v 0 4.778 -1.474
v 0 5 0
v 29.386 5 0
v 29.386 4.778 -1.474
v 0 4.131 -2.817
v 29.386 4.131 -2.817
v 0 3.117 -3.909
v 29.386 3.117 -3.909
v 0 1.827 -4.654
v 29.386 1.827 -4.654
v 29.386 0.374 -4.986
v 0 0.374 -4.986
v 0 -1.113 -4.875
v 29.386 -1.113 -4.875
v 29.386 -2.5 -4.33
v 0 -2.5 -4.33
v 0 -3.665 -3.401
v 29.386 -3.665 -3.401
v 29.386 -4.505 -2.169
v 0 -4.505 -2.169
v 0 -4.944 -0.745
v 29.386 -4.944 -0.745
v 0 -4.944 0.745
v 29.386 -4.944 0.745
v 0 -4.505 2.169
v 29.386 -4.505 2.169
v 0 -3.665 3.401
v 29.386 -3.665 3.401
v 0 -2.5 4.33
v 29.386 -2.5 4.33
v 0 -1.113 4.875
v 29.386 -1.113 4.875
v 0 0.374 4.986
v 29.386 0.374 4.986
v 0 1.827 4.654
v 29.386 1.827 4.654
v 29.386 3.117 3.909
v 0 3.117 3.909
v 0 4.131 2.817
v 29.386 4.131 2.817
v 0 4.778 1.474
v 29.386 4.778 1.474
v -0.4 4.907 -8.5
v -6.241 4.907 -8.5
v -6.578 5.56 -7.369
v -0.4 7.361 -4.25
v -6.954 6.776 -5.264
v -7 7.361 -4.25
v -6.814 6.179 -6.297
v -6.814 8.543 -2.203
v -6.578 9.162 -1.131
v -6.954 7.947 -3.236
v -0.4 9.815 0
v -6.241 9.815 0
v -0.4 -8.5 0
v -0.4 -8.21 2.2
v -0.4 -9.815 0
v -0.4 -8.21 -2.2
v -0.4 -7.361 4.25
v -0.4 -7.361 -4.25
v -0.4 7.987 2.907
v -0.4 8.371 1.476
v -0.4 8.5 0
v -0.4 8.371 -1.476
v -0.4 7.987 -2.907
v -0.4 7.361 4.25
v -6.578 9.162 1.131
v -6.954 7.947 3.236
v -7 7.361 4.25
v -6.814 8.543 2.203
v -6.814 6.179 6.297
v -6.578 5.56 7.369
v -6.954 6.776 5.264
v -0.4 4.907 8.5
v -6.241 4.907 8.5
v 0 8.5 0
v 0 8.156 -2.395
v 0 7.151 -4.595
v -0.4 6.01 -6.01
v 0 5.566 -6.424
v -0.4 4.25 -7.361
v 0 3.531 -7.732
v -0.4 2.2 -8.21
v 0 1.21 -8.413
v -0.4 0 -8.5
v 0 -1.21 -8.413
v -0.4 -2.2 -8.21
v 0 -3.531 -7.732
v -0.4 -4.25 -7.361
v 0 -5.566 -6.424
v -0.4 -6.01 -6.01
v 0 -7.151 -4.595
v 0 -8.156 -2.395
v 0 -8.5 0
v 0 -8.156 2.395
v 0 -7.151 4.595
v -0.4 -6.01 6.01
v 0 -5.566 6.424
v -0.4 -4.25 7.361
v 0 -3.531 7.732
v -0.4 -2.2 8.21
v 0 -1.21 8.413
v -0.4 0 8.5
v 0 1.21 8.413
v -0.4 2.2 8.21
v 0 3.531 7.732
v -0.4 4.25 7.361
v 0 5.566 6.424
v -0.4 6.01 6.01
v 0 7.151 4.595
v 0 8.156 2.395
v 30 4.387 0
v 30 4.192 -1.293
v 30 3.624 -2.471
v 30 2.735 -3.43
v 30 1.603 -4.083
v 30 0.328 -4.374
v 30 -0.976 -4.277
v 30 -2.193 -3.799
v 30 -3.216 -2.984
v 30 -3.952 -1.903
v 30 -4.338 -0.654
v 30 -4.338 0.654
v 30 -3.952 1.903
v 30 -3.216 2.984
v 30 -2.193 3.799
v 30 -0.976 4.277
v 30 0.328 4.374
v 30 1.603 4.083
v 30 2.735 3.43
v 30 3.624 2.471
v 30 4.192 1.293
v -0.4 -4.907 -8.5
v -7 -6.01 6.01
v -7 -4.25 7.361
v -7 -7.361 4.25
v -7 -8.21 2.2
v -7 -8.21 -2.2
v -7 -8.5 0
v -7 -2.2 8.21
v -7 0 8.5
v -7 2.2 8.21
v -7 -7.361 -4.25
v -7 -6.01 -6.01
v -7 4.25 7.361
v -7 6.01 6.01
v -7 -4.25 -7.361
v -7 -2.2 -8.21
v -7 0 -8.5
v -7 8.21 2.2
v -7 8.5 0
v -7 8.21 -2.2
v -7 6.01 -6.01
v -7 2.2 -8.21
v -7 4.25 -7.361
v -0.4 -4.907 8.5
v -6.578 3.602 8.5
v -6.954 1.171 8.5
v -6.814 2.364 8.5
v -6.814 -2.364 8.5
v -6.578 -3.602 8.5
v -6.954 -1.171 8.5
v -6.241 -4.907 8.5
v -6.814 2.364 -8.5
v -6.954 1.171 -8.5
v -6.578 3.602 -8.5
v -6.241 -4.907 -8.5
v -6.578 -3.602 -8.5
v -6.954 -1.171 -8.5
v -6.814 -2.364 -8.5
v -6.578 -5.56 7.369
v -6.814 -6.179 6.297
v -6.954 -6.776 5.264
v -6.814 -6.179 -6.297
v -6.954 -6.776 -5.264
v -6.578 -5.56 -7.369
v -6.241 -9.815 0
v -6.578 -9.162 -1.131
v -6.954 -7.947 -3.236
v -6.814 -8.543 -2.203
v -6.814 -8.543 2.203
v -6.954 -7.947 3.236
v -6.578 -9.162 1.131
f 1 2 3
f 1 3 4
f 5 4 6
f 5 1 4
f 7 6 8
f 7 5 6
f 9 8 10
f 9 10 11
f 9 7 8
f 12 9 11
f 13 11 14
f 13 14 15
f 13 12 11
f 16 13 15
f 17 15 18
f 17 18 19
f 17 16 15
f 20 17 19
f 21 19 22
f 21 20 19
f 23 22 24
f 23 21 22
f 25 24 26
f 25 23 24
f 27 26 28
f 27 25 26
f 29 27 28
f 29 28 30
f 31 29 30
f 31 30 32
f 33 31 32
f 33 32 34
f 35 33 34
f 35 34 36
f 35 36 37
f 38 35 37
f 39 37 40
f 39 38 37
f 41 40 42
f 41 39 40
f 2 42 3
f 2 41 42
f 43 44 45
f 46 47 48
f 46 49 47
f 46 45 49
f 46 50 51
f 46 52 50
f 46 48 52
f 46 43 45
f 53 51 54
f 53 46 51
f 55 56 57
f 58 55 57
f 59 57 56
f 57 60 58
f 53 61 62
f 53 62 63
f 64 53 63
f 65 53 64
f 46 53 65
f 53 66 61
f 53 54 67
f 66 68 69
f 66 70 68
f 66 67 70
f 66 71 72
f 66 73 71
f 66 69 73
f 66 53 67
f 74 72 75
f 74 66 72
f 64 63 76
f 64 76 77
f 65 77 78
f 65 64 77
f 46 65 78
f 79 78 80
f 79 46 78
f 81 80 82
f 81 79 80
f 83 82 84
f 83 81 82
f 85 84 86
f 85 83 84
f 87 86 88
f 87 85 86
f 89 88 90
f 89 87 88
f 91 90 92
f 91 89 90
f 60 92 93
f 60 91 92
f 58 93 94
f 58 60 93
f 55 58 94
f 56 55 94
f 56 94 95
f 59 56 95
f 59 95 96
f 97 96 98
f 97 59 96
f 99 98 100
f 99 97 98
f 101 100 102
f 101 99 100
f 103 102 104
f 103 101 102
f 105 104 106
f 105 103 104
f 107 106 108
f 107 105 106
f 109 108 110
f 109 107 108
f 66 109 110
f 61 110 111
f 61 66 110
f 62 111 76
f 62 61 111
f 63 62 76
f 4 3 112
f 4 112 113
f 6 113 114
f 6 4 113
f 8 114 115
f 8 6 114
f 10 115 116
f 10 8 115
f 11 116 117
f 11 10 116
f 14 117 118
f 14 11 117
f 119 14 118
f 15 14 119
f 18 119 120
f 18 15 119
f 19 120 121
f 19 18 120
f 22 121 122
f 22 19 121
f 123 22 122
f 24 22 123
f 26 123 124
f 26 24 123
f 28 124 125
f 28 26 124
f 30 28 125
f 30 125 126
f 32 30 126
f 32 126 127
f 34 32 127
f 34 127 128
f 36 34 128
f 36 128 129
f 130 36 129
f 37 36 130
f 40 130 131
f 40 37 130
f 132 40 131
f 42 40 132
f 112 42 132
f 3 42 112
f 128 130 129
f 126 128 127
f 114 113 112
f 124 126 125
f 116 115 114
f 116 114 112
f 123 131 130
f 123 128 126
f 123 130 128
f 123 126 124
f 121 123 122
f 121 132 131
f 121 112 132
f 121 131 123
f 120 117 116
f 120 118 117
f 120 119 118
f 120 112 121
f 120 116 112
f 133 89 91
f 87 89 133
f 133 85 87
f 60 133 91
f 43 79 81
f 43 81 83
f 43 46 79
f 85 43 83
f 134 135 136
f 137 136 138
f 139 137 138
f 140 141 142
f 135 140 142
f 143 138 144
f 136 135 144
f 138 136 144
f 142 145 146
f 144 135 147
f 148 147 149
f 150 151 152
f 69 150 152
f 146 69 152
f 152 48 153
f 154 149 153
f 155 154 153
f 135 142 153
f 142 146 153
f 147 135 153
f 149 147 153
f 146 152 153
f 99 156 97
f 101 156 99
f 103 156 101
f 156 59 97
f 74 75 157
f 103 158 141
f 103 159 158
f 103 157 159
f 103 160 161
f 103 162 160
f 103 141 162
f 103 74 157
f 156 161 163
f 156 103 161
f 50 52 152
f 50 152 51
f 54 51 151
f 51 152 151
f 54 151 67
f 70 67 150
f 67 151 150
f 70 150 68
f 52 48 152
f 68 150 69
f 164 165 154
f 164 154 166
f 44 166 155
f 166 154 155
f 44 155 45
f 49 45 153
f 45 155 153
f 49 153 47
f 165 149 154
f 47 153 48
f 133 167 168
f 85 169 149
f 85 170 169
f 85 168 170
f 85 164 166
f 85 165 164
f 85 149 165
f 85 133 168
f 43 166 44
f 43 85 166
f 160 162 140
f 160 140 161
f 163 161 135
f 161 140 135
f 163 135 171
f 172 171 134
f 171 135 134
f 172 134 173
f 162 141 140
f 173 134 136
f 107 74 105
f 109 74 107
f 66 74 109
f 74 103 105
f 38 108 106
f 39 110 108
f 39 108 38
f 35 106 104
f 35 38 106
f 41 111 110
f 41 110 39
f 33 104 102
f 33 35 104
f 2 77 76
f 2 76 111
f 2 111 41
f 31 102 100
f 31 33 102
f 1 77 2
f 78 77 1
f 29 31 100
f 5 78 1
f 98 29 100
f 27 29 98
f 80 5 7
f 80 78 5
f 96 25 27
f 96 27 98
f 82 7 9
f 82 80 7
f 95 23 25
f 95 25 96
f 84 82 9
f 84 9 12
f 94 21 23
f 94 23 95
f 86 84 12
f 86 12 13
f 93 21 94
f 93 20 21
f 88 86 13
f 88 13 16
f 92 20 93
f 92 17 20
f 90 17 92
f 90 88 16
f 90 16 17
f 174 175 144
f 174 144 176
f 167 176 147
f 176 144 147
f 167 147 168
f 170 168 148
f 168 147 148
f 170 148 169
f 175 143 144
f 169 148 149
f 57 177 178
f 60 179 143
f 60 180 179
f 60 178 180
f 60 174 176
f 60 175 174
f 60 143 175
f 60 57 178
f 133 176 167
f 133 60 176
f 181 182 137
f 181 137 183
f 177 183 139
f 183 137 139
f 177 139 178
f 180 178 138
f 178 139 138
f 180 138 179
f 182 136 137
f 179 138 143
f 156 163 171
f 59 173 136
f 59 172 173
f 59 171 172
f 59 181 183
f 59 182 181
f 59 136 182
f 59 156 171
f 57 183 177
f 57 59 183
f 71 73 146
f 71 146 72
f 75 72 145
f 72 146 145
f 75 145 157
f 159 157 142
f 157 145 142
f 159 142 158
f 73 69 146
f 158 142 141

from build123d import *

# Parameters (mm, degrees)
EXTRUDE_559_DEPTH = 6.6
CHAMFER_2_SIZE    = 0.61345
CHAMFER_2_SIZE2   = 0.61355


with BuildPart() as part:
    # 草圖1 → Revolve 409 (revolve)
    with BuildSketch(Plane.XY):
        Polygon((-0.4001, 0), (30, 0), (30, 5), (3, 5), (2.38645, 5), (0, 5), (0, 8.5), (-0.4001, 8.5), align=None)
    revolve(axis=Axis((30, 0, 0), (-1, 0, 0)))

    # 草圖2 → Extrude 559 (add)
    with BuildSketch(Plane.ZY.offset(0.4001)):
        Polygon((0, 9.814954576), (8.5, 4.907477288), (8.5, -4.907477288), (0, -9.814954576), (-8.5, -4.907477288), (-8.5, 4.907477288), align=None)
    extrude(amount=EXTRUDE_559_DEPTH)

    # 草圖3 → Cut-Revolve 678 (revolve, cut)
    with BuildSketch(Plane.XY):
        Polygon((-7.0001, 8.5), (-7.0001, 9.814954576), (-6.240910621, 9.814954576), align=None)
    revolve(axis=Axis((-8.3201, 0, 0), (1, 0, 0)), mode=Mode.SUBTRACT)

    # 倒角2
    chamfer_2_edges = [part.edges().sort_by_distance(p)[0] for p in [
        (30, -5, 0),
    ]]
    chamfer_2_side = [part.faces().sort_by_distance(p)[0] for p in [
        (30, 0, 0),
    ]]
    chamfer(chamfer_2_edges, length=CHAMFER_2_SIZE, length2=CHAMFER_2_SIZE2, reference=chamfer_2_side[0])


solid = part.part
